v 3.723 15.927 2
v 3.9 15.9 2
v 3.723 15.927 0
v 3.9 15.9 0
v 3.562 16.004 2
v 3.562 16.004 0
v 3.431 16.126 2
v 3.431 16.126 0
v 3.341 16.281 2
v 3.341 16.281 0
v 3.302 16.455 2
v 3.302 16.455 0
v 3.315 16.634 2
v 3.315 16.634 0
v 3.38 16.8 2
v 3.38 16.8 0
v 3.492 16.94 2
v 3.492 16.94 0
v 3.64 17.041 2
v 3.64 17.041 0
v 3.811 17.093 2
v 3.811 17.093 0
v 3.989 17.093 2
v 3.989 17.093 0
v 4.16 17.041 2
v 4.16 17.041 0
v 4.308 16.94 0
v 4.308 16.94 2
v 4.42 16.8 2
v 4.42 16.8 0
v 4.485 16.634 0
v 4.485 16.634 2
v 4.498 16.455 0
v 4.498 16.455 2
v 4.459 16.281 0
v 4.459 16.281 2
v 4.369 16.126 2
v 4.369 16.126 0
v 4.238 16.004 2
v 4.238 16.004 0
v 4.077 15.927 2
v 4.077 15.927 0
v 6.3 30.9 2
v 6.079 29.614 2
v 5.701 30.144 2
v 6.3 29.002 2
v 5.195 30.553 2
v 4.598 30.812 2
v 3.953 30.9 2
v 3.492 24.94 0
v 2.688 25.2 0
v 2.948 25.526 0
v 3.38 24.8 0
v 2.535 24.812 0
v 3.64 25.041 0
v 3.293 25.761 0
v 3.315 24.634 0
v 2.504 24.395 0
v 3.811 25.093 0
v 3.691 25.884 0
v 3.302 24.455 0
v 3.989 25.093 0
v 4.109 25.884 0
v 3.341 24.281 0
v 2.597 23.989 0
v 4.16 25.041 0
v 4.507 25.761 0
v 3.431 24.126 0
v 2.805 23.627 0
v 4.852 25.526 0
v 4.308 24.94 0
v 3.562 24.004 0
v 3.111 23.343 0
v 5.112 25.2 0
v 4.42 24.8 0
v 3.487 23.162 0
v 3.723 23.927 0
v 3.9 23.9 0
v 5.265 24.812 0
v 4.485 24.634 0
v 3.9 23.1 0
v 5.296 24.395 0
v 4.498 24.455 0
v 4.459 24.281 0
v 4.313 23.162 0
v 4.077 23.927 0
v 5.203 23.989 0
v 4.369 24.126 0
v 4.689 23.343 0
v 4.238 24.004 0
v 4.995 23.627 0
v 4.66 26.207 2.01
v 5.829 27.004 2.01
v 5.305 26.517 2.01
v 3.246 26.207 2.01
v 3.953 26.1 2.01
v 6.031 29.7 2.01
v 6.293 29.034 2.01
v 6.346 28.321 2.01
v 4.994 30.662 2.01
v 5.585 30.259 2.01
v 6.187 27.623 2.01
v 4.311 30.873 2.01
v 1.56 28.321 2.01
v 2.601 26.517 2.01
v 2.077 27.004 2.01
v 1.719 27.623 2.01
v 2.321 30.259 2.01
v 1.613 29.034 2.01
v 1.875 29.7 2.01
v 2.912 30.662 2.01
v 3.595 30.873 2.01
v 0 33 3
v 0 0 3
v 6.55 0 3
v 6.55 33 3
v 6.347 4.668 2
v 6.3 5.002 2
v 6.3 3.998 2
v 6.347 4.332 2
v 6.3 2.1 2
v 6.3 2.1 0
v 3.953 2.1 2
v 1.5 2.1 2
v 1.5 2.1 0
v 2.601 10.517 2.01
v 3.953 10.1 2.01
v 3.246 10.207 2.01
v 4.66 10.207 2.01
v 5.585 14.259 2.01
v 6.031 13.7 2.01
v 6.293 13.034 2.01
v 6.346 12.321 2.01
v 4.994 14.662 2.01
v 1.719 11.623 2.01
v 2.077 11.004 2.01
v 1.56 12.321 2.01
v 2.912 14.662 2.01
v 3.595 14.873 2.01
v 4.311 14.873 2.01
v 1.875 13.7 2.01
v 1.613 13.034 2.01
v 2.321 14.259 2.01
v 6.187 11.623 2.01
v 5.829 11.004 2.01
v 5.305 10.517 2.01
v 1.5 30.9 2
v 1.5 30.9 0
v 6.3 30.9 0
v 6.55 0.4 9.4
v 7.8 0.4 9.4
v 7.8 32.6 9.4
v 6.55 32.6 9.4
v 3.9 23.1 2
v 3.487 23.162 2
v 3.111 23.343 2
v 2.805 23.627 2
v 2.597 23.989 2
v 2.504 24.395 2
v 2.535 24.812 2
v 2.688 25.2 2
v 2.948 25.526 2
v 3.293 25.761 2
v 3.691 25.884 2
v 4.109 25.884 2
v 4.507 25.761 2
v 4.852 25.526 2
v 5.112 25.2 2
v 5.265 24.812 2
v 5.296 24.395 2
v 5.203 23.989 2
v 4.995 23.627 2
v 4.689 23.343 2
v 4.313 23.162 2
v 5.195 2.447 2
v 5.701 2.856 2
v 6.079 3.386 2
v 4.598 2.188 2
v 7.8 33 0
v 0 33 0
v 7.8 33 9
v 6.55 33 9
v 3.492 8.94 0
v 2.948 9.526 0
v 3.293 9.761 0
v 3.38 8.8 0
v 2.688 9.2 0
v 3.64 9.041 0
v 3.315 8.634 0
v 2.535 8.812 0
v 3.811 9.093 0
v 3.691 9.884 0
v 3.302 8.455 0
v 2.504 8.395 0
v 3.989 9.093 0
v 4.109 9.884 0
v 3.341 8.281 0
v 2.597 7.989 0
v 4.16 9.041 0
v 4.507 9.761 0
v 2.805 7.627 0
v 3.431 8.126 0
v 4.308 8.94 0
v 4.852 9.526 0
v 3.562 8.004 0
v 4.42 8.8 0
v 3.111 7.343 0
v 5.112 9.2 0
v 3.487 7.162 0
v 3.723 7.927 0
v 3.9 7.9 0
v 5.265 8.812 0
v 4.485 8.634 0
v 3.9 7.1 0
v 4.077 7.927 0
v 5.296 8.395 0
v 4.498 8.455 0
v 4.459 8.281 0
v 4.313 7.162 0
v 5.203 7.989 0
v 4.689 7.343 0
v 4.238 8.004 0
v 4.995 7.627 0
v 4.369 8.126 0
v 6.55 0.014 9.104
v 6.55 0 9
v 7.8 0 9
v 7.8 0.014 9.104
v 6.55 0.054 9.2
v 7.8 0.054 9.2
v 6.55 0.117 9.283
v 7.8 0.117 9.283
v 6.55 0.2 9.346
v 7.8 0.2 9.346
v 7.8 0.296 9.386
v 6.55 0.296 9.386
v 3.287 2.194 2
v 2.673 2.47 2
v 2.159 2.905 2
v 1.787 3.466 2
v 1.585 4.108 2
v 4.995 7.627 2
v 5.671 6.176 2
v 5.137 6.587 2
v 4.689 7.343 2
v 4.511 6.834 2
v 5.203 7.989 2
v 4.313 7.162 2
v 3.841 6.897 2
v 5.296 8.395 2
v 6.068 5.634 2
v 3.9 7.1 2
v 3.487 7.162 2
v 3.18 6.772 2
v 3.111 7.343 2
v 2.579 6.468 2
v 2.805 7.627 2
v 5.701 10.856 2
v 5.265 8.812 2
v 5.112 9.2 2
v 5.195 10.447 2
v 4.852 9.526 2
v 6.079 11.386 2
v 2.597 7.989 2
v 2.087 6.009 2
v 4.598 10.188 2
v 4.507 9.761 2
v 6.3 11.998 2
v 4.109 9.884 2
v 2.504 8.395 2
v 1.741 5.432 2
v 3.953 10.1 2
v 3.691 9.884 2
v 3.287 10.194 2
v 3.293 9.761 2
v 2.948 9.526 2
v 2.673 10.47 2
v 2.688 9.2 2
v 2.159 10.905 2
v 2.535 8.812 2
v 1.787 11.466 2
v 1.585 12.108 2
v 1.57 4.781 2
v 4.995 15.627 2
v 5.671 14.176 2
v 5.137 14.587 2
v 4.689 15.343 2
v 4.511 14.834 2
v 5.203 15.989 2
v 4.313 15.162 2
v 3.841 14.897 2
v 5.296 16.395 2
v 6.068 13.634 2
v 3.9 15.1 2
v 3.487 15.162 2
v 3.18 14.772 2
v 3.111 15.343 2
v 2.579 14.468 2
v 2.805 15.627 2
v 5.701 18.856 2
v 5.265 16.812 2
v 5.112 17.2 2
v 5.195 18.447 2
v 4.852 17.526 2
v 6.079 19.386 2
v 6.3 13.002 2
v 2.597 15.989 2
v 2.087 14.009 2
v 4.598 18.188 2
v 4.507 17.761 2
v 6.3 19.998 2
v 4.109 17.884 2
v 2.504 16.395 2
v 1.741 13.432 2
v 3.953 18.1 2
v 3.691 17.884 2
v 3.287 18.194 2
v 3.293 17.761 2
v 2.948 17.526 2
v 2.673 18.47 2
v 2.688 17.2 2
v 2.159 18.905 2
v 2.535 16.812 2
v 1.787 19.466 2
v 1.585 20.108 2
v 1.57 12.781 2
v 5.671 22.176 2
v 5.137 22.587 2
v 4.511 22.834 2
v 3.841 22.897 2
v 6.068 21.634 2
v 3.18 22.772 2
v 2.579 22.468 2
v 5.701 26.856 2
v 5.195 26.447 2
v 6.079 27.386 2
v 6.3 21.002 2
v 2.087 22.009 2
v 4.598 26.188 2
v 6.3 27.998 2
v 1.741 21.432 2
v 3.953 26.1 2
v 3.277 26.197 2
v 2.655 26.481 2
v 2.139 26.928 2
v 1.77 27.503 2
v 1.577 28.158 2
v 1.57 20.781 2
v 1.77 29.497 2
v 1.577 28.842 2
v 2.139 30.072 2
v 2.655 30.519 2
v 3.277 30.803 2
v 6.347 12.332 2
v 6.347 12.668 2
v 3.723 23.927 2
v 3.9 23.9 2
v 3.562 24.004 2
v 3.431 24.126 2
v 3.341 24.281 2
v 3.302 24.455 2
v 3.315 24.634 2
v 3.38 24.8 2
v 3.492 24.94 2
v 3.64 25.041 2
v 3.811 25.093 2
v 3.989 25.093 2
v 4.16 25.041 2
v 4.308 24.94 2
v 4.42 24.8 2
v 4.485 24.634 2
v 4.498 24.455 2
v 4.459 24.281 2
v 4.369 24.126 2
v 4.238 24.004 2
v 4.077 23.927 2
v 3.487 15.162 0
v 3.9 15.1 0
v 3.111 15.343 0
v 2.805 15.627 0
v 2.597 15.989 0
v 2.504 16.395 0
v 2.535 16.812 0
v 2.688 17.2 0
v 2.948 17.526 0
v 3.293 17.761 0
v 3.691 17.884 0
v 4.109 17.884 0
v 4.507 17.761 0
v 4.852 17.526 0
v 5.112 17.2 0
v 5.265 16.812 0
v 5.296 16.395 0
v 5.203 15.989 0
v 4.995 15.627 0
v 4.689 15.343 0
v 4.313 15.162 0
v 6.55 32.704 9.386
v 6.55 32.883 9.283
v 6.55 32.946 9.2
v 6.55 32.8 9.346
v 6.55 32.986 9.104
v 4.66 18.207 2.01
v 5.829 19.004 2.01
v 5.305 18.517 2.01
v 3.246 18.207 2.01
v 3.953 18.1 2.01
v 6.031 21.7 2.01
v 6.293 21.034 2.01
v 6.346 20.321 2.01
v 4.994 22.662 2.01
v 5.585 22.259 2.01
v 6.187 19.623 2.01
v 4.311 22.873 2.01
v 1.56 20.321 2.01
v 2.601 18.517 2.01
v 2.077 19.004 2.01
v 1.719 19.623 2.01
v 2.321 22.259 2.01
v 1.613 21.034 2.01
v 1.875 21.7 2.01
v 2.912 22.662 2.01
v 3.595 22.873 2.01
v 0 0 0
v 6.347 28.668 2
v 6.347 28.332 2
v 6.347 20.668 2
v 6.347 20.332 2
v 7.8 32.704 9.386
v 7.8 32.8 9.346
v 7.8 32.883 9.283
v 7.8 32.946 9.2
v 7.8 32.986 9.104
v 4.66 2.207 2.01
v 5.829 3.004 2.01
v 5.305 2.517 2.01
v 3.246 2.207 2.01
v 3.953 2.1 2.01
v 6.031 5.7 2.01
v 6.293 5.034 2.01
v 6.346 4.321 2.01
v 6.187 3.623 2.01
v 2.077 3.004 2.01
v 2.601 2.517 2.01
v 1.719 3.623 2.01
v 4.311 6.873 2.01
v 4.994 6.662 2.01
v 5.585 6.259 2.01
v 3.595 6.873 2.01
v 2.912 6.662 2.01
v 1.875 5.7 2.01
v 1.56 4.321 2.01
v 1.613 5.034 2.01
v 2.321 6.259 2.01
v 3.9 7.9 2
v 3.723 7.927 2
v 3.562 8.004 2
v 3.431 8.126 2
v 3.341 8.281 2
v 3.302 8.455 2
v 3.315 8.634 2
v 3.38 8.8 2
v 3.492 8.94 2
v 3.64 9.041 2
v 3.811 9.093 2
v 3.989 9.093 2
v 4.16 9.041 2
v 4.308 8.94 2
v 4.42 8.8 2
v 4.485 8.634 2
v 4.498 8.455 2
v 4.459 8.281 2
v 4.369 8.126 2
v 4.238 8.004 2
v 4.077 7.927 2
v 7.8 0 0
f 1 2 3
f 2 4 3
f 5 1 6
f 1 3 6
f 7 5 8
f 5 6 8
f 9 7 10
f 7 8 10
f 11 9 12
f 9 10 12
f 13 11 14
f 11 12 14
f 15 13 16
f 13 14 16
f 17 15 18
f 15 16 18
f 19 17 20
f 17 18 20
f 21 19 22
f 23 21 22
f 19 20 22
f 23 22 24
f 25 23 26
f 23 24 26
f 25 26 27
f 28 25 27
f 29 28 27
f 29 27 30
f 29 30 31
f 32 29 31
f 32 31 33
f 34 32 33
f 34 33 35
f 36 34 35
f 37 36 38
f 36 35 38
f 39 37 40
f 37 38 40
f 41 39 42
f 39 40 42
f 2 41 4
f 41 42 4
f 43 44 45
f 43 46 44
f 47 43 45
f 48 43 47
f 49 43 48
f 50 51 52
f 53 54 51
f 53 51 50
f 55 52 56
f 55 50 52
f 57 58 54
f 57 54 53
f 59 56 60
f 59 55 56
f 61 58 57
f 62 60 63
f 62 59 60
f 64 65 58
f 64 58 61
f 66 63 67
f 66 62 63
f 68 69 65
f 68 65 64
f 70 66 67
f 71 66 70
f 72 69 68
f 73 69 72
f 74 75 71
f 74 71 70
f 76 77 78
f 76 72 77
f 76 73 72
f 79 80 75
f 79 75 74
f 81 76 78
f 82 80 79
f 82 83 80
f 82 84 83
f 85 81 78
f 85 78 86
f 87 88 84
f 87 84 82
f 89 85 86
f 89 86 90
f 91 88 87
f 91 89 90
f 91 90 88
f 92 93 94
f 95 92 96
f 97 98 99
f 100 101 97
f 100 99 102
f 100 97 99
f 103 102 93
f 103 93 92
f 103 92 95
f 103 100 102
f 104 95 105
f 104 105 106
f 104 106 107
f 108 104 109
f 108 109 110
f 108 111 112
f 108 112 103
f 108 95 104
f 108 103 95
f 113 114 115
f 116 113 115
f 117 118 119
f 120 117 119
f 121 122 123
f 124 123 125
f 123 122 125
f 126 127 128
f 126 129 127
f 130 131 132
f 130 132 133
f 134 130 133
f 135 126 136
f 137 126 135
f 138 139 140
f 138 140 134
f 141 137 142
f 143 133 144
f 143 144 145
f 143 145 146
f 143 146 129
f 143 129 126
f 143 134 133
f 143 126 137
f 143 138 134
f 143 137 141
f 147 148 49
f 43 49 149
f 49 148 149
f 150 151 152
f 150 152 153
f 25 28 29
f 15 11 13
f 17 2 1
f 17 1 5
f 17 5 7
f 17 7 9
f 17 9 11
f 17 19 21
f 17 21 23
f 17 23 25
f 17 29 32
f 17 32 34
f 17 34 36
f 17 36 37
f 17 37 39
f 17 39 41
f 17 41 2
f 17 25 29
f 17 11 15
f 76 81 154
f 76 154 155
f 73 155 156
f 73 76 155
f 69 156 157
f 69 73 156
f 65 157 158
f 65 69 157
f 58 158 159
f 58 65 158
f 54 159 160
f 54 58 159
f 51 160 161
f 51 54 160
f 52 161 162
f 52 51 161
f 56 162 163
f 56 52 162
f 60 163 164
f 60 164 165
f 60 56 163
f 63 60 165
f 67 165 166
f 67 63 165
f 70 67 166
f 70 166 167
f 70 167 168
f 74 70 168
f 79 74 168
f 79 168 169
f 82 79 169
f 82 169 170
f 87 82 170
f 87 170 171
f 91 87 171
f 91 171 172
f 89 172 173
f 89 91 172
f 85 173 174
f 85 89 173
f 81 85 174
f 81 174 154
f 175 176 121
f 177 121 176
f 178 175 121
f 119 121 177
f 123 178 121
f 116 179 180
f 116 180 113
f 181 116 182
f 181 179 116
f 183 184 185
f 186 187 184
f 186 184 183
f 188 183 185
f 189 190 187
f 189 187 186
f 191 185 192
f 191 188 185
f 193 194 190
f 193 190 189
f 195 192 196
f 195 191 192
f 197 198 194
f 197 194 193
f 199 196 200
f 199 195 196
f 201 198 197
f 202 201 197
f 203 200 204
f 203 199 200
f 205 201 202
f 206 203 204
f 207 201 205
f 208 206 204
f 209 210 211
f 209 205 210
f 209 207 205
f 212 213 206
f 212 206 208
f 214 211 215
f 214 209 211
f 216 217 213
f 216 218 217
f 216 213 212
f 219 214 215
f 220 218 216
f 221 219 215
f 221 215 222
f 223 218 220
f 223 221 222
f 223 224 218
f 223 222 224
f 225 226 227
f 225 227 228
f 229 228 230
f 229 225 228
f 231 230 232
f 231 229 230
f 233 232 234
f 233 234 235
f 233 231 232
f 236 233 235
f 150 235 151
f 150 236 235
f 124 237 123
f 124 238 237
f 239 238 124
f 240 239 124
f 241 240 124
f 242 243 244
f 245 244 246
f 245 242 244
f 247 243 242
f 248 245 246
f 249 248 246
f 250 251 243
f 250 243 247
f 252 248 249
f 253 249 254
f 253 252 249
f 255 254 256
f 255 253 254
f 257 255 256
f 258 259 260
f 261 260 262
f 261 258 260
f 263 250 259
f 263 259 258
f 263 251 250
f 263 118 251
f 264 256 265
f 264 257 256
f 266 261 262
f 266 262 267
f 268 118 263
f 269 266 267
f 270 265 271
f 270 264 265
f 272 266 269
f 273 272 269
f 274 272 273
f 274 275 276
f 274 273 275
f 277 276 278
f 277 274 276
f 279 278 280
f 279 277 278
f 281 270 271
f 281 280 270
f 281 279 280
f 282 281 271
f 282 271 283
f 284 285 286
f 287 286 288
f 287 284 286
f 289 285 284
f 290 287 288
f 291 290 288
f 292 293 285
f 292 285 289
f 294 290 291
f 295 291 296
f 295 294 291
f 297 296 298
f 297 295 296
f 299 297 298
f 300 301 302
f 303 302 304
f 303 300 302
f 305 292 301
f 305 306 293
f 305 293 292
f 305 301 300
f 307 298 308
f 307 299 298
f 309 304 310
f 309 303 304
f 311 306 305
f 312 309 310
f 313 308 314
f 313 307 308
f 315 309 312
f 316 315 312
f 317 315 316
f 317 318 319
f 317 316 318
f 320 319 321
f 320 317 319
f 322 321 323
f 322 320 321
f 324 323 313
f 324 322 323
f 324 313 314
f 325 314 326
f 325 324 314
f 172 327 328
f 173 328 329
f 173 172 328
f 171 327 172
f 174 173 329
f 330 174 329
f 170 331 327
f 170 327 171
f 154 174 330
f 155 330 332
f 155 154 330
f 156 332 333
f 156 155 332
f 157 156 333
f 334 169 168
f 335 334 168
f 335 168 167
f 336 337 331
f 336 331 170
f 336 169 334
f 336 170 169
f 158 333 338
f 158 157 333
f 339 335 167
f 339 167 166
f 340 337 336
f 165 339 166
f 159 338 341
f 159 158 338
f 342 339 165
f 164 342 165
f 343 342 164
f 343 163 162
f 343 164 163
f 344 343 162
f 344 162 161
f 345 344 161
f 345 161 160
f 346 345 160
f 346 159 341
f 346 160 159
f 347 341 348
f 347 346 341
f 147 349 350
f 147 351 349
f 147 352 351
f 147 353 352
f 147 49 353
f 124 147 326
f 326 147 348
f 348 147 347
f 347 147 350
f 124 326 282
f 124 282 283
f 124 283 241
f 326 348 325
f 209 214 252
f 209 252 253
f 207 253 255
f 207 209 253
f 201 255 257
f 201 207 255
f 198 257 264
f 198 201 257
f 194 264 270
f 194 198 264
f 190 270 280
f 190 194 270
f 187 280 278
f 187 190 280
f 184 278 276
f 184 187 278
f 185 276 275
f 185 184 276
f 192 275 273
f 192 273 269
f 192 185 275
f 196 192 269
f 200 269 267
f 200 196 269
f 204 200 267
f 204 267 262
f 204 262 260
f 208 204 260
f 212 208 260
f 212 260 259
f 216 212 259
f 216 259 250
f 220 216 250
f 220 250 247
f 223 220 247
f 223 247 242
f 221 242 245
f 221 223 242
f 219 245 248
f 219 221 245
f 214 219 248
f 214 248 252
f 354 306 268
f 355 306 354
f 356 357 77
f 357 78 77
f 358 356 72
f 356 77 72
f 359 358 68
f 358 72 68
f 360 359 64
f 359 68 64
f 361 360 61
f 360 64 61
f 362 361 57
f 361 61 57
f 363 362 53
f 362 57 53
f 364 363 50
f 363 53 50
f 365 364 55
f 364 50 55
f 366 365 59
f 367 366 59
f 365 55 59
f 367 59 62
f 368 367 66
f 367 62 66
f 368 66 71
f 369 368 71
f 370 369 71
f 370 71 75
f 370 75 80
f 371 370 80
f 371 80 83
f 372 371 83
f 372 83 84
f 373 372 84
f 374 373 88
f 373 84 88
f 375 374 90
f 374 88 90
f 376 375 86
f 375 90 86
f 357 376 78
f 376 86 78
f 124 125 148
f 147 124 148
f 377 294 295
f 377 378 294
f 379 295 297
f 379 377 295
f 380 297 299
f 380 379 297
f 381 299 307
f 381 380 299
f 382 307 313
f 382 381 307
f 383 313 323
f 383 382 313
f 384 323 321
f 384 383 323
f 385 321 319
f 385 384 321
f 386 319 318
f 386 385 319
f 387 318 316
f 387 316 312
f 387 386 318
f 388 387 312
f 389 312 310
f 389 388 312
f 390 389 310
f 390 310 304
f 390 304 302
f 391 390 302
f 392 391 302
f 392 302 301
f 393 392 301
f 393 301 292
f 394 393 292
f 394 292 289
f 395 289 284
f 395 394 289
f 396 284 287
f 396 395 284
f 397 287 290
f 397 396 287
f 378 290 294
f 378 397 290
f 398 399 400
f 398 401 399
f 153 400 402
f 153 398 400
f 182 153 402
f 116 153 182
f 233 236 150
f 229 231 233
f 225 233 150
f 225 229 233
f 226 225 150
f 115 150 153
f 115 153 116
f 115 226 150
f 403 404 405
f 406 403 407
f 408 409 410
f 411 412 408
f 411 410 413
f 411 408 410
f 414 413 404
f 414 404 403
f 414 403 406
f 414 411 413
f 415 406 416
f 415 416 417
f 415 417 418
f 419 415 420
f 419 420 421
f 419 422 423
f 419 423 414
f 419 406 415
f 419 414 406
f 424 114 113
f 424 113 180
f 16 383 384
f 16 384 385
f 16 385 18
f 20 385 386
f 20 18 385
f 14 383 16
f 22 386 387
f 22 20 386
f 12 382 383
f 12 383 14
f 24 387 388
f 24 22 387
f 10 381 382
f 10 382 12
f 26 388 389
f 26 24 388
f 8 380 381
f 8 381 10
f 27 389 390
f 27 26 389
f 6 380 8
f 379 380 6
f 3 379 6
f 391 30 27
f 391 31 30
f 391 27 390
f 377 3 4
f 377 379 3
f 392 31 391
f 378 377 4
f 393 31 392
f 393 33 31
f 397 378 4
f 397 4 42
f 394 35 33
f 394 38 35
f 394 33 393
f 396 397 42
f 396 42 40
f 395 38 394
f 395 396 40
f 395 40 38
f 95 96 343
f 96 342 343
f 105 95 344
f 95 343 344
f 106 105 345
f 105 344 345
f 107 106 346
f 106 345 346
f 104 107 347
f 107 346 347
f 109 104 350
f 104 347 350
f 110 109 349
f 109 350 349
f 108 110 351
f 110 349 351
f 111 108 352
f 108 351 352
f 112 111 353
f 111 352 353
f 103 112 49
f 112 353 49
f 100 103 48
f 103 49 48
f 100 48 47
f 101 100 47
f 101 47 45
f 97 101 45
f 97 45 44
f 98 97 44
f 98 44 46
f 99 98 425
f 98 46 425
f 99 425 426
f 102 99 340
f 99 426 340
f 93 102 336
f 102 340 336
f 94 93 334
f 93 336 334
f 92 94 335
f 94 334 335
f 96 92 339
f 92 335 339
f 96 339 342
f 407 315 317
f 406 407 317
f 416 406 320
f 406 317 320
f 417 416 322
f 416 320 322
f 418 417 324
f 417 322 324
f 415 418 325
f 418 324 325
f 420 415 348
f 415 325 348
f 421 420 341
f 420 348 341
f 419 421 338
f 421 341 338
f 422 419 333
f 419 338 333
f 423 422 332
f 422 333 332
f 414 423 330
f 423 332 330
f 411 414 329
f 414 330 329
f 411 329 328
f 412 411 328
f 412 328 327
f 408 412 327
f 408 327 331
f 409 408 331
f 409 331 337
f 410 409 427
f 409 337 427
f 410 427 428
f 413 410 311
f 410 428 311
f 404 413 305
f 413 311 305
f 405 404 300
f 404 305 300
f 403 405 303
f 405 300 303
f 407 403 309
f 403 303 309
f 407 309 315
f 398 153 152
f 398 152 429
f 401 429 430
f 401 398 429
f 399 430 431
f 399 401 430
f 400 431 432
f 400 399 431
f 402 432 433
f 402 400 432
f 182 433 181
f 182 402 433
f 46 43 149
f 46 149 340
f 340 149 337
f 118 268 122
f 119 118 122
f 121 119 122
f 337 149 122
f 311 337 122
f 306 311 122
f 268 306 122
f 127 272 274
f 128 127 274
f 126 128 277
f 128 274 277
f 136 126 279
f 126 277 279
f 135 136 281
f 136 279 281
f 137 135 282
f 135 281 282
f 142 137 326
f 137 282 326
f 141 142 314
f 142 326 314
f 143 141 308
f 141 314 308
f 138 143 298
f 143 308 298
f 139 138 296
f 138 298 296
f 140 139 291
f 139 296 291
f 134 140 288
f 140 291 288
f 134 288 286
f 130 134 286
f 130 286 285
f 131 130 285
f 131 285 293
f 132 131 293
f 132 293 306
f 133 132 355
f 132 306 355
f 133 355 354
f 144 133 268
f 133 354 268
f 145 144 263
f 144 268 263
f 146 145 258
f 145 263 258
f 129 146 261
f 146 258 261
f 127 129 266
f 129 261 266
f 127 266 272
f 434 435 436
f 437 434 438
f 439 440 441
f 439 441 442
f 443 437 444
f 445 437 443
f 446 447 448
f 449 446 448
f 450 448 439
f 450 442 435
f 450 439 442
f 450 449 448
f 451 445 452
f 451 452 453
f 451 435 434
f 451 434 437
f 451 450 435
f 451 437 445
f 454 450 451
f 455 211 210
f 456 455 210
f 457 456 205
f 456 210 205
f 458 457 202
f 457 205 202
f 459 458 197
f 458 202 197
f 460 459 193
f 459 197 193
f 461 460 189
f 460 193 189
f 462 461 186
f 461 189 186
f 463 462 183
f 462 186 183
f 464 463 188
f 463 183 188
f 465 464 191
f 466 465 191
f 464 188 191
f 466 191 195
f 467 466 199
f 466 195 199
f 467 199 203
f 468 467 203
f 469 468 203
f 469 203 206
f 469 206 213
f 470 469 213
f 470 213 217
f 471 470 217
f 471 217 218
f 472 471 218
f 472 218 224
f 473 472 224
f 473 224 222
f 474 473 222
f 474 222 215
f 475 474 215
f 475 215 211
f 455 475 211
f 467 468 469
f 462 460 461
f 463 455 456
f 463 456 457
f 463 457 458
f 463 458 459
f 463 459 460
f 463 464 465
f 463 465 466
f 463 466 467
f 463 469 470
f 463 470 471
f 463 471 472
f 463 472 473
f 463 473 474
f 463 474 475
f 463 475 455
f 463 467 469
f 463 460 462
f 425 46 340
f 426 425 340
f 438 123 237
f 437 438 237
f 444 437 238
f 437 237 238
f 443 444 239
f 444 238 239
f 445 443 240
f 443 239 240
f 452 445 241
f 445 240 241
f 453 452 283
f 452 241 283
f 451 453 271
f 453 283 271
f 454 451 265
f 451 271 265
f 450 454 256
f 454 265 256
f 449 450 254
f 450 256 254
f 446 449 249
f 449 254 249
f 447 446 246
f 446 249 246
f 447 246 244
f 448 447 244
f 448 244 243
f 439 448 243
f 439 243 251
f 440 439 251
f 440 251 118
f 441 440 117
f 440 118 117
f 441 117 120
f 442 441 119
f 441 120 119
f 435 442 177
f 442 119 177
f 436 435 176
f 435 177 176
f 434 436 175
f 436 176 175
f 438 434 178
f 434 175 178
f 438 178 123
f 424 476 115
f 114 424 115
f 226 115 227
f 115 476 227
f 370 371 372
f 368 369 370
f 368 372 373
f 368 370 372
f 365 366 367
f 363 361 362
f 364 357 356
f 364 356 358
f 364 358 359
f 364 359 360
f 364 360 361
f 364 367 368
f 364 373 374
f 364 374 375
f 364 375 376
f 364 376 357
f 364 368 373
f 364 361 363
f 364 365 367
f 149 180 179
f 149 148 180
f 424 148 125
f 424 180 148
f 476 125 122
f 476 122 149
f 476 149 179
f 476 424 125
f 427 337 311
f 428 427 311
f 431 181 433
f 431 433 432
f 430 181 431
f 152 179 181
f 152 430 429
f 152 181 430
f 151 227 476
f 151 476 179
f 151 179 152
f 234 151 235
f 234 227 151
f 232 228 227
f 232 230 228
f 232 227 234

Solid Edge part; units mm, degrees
sketch "Sketch1" plane through (0, 0, 0) normal (0, -1, 0) x (1, 0, 0)
  line L0 (0, 3) -> (6.55, 3)
  line L1 (6.55, 9.4) -> (6.55, 3)
  line L2 (7.8, 9.4) -> (6.55, 9.4)
  line L3 (7.8, 0) -> (7.8, 9.4)
  line L4 (0, 0) -> (7.8, 0)
  line L5 (0, 3) -> (0, 0)
  dimension "D1" = 6.55
  dimension "D2" = 9.4
extrude "Protrusion1" add sketch "Sketch1" against normal blind 33
sketch "Sketch2" plane through (3.9, 16.5, 0) normal (0, 0, -1) x (0, -1, 0)
  line L0 (-14.4, -2.4) -> (14.4, -2.4)
  line L1 (14.4, -2.4) -> (14.4, 2.4)
  line L2 (14.4, 2.4) -> (-14.4, 2.4)
  line L3 (-14.4, 2.4) -> (-14.4, -2.4)
  circle A0 centre (-8, 0) radius 1.4
  circle A1 centre (0, 0) radius 1.4
  circle A2 centre (8, 0) radius 1.4
  circle A3 centre (-8, 0) radius 0.6
  circle A4 centre (0, 0) radius 0.6
  circle A5 centre (8, 0) radius 0.6
  dimension "D1" = 28.8
  dimension "D2" = 4.8
  dimension "D3" = 2.8
  dimension "D4" = 2.8
  dimension "D5" = 2.8
  dimension "D6" = 1.2
  dimension "D7" = 1.2
  dimension "D8" = 1.2
extrude "ExtrudedCutout_1" cut sketch "Sketch2" against normal blind 2
fillet "Round_1" radius 0.4 2 edges at (7.175, 33, 9.4) (7.175, 0, 9.4)
sketch "Sketch3" plane through (3.9, 16.5, 2) normal (0, 0, -1) x (0, -1, 0)
  circle A0 centre (-12, -0.053) radius 2.4
  circle A1 centre (-4, -0.053) radius 2.4
  circle A2 centre (4, -0.053) radius 2.4
  circle A3 centre (12, -0.053) radius 2.4
  dimension "D1" = 4.8
  dimension "D2" = 4.8
  dimension "D3" = 4.8
  dimension "D4" = 4.8
extrude "ExtrudedCutout_2" cut sketch "Sketch3" against normal blind 0.01
